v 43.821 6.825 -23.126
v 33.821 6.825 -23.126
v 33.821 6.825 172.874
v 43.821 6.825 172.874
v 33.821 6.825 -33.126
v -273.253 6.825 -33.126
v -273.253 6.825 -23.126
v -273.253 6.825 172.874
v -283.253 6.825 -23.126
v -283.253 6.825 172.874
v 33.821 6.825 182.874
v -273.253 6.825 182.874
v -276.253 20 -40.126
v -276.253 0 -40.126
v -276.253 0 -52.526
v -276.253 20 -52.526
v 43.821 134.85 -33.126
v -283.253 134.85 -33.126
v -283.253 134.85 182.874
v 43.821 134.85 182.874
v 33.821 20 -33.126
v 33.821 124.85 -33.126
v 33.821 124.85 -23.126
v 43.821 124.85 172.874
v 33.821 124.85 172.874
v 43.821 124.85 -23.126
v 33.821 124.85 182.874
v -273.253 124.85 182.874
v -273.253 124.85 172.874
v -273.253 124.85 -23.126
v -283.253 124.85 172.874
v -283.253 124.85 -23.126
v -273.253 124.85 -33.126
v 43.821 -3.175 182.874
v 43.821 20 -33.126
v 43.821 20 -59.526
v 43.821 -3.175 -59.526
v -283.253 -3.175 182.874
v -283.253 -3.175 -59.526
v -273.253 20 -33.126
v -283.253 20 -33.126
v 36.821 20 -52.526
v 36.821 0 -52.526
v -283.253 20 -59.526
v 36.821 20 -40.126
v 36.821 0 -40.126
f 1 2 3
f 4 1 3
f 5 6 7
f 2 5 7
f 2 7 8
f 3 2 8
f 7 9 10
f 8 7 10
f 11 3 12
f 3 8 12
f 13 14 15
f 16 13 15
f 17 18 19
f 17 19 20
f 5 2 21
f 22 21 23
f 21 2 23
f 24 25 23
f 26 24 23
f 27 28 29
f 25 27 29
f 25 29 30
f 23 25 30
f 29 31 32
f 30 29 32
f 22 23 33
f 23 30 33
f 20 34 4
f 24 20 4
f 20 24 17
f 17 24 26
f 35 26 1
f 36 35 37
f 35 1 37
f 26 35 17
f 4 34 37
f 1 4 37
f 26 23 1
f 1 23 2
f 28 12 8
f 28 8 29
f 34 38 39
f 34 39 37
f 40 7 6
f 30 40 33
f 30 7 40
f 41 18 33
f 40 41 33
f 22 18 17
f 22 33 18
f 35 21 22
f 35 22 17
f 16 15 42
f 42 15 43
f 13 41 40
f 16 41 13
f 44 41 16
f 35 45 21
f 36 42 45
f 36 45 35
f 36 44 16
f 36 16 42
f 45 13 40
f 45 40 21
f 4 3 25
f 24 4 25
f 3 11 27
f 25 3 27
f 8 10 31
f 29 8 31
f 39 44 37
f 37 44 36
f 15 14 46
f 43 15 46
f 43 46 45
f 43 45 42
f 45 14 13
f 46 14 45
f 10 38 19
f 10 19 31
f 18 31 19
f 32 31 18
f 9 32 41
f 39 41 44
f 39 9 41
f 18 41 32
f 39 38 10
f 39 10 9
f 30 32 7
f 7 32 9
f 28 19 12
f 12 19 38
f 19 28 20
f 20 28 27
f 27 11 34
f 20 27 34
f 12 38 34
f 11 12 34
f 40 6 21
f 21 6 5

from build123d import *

# Parameters (mm, degrees)
SKETCH1_W           = 327.074
SKETCH1_H           = 26.4
SKETCH1_W_2         = 313.074
SKETCH1_H_2         = 12.4
BOSS_EXTRUDE1_DEPTH = 20
SKETCH2_W           = 327.074
SKETCH2_H           = 242.4
BOSS_EXTRUDE2_DEPTH = 3.175
SKETCH3_W           = 327.074
SKETCH3_H           = 216
BOSS_EXTRUDE3_DEPTH = 134.85
CUT_EXTRUDE1_REACH  = 400.252
CUT_EXTRUDE2_REACH  = 398.452
SKETCH5_W           = 307.074
SKETCH5_H           = 118.025


with BuildPart() as part:
    # Sketch1 → Boss-Extrude1 (new body)
    with BuildSketch(Plane(origin=(0, 0, 0), x_dir=(1, 0, 0), z_dir=(0, 1, 0))):
        with Locations((-119.715833623, 46.325831873)):
            Rectangle(SKETCH1_W, SKETCH1_H)
        with Locations((-119.715833623, 46.325831873)):
            Rectangle(SKETCH1_W_2, SKETCH1_H_2, mode=Mode.SUBTRACT)
    extrude(amount=BOSS_EXTRUDE1_DEPTH)

    # Sketch2 → Boss-Extrude2 (add)
    with BuildSketch(Plane.XZ):
        with Locations((-119.715833623, 61.674168127)):
            Rectangle(SKETCH2_W, SKETCH2_H)
    extrude(amount=BOSS_EXTRUDE2_DEPTH)

    # Sketch3 → Boss-Extrude3 (add)
    with BuildSketch(Plane(origin=(0, 0, 0), x_dir=(1, 0, 0), z_dir=(0, 1, 0))):
        with Locations((-119.715833623, -74.874168127)):
            Rectangle(SKETCH3_W, SKETCH3_H)
    extrude(amount=BOSS_EXTRUDE3_DEPTH)

    # Sketch4 → Cut-Extrude1 (cut, up to next)
    with BuildSketch(Plane.ZY.offset(283.252833623), mode=Mode.PRIVATE) as cut_extrude1_sk1:
        Polygon((-23.125831873, 10), (-23.125831873, 6.825), (172.874168127, 6.825), (172.874168127, 124.85), (-23.125831873, 124.85), align=None)
    cut_extrude1_tool1 = extrude(cut_extrude1_sk1.sketch, amount=-CUT_EXTRUDE1_REACH, mode=Mode.PRIVATE) & part.part
    add(cut_extrude1_tool1.solids().sort_by_distance((-283.252834, 65.8375, 74.874168))[0], mode=Mode.SUBTRACT)

    # Cut-Extrude2: up to this face of the body (flat: up to its plane)
    cut_extrude2_end = Plane(part.part.faces().sort_by_distance((-119.715833623, 77.425, -33.125831873))[0])
    # Sketch5 → Cut-Extrude2 (cut, up to the picked face)
    with BuildSketch(Plane.XY.offset(182.874168127), mode=Mode.PRIVATE) as cut_extrude2_sk1:
        with Locations((-119.715833623, 65.8375)):
            Rectangle(SKETCH5_W, SKETCH5_H)
    cut_extrude2_tool1 = split(extrude(cut_extrude2_sk1.sketch, amount=-CUT_EXTRUDE2_REACH, mode=Mode.PRIVATE), bisect_by=cut_extrude2_end, keep=Keep.BOTH, mode=Mode.PRIVATE)
    add(cut_extrude2_tool1.solids().sort_by(Axis((-119.715834, 65.8375, 182.874168), (0, 0, -1)))[0], mode=Mode.SUBTRACT)


solid = part.part
